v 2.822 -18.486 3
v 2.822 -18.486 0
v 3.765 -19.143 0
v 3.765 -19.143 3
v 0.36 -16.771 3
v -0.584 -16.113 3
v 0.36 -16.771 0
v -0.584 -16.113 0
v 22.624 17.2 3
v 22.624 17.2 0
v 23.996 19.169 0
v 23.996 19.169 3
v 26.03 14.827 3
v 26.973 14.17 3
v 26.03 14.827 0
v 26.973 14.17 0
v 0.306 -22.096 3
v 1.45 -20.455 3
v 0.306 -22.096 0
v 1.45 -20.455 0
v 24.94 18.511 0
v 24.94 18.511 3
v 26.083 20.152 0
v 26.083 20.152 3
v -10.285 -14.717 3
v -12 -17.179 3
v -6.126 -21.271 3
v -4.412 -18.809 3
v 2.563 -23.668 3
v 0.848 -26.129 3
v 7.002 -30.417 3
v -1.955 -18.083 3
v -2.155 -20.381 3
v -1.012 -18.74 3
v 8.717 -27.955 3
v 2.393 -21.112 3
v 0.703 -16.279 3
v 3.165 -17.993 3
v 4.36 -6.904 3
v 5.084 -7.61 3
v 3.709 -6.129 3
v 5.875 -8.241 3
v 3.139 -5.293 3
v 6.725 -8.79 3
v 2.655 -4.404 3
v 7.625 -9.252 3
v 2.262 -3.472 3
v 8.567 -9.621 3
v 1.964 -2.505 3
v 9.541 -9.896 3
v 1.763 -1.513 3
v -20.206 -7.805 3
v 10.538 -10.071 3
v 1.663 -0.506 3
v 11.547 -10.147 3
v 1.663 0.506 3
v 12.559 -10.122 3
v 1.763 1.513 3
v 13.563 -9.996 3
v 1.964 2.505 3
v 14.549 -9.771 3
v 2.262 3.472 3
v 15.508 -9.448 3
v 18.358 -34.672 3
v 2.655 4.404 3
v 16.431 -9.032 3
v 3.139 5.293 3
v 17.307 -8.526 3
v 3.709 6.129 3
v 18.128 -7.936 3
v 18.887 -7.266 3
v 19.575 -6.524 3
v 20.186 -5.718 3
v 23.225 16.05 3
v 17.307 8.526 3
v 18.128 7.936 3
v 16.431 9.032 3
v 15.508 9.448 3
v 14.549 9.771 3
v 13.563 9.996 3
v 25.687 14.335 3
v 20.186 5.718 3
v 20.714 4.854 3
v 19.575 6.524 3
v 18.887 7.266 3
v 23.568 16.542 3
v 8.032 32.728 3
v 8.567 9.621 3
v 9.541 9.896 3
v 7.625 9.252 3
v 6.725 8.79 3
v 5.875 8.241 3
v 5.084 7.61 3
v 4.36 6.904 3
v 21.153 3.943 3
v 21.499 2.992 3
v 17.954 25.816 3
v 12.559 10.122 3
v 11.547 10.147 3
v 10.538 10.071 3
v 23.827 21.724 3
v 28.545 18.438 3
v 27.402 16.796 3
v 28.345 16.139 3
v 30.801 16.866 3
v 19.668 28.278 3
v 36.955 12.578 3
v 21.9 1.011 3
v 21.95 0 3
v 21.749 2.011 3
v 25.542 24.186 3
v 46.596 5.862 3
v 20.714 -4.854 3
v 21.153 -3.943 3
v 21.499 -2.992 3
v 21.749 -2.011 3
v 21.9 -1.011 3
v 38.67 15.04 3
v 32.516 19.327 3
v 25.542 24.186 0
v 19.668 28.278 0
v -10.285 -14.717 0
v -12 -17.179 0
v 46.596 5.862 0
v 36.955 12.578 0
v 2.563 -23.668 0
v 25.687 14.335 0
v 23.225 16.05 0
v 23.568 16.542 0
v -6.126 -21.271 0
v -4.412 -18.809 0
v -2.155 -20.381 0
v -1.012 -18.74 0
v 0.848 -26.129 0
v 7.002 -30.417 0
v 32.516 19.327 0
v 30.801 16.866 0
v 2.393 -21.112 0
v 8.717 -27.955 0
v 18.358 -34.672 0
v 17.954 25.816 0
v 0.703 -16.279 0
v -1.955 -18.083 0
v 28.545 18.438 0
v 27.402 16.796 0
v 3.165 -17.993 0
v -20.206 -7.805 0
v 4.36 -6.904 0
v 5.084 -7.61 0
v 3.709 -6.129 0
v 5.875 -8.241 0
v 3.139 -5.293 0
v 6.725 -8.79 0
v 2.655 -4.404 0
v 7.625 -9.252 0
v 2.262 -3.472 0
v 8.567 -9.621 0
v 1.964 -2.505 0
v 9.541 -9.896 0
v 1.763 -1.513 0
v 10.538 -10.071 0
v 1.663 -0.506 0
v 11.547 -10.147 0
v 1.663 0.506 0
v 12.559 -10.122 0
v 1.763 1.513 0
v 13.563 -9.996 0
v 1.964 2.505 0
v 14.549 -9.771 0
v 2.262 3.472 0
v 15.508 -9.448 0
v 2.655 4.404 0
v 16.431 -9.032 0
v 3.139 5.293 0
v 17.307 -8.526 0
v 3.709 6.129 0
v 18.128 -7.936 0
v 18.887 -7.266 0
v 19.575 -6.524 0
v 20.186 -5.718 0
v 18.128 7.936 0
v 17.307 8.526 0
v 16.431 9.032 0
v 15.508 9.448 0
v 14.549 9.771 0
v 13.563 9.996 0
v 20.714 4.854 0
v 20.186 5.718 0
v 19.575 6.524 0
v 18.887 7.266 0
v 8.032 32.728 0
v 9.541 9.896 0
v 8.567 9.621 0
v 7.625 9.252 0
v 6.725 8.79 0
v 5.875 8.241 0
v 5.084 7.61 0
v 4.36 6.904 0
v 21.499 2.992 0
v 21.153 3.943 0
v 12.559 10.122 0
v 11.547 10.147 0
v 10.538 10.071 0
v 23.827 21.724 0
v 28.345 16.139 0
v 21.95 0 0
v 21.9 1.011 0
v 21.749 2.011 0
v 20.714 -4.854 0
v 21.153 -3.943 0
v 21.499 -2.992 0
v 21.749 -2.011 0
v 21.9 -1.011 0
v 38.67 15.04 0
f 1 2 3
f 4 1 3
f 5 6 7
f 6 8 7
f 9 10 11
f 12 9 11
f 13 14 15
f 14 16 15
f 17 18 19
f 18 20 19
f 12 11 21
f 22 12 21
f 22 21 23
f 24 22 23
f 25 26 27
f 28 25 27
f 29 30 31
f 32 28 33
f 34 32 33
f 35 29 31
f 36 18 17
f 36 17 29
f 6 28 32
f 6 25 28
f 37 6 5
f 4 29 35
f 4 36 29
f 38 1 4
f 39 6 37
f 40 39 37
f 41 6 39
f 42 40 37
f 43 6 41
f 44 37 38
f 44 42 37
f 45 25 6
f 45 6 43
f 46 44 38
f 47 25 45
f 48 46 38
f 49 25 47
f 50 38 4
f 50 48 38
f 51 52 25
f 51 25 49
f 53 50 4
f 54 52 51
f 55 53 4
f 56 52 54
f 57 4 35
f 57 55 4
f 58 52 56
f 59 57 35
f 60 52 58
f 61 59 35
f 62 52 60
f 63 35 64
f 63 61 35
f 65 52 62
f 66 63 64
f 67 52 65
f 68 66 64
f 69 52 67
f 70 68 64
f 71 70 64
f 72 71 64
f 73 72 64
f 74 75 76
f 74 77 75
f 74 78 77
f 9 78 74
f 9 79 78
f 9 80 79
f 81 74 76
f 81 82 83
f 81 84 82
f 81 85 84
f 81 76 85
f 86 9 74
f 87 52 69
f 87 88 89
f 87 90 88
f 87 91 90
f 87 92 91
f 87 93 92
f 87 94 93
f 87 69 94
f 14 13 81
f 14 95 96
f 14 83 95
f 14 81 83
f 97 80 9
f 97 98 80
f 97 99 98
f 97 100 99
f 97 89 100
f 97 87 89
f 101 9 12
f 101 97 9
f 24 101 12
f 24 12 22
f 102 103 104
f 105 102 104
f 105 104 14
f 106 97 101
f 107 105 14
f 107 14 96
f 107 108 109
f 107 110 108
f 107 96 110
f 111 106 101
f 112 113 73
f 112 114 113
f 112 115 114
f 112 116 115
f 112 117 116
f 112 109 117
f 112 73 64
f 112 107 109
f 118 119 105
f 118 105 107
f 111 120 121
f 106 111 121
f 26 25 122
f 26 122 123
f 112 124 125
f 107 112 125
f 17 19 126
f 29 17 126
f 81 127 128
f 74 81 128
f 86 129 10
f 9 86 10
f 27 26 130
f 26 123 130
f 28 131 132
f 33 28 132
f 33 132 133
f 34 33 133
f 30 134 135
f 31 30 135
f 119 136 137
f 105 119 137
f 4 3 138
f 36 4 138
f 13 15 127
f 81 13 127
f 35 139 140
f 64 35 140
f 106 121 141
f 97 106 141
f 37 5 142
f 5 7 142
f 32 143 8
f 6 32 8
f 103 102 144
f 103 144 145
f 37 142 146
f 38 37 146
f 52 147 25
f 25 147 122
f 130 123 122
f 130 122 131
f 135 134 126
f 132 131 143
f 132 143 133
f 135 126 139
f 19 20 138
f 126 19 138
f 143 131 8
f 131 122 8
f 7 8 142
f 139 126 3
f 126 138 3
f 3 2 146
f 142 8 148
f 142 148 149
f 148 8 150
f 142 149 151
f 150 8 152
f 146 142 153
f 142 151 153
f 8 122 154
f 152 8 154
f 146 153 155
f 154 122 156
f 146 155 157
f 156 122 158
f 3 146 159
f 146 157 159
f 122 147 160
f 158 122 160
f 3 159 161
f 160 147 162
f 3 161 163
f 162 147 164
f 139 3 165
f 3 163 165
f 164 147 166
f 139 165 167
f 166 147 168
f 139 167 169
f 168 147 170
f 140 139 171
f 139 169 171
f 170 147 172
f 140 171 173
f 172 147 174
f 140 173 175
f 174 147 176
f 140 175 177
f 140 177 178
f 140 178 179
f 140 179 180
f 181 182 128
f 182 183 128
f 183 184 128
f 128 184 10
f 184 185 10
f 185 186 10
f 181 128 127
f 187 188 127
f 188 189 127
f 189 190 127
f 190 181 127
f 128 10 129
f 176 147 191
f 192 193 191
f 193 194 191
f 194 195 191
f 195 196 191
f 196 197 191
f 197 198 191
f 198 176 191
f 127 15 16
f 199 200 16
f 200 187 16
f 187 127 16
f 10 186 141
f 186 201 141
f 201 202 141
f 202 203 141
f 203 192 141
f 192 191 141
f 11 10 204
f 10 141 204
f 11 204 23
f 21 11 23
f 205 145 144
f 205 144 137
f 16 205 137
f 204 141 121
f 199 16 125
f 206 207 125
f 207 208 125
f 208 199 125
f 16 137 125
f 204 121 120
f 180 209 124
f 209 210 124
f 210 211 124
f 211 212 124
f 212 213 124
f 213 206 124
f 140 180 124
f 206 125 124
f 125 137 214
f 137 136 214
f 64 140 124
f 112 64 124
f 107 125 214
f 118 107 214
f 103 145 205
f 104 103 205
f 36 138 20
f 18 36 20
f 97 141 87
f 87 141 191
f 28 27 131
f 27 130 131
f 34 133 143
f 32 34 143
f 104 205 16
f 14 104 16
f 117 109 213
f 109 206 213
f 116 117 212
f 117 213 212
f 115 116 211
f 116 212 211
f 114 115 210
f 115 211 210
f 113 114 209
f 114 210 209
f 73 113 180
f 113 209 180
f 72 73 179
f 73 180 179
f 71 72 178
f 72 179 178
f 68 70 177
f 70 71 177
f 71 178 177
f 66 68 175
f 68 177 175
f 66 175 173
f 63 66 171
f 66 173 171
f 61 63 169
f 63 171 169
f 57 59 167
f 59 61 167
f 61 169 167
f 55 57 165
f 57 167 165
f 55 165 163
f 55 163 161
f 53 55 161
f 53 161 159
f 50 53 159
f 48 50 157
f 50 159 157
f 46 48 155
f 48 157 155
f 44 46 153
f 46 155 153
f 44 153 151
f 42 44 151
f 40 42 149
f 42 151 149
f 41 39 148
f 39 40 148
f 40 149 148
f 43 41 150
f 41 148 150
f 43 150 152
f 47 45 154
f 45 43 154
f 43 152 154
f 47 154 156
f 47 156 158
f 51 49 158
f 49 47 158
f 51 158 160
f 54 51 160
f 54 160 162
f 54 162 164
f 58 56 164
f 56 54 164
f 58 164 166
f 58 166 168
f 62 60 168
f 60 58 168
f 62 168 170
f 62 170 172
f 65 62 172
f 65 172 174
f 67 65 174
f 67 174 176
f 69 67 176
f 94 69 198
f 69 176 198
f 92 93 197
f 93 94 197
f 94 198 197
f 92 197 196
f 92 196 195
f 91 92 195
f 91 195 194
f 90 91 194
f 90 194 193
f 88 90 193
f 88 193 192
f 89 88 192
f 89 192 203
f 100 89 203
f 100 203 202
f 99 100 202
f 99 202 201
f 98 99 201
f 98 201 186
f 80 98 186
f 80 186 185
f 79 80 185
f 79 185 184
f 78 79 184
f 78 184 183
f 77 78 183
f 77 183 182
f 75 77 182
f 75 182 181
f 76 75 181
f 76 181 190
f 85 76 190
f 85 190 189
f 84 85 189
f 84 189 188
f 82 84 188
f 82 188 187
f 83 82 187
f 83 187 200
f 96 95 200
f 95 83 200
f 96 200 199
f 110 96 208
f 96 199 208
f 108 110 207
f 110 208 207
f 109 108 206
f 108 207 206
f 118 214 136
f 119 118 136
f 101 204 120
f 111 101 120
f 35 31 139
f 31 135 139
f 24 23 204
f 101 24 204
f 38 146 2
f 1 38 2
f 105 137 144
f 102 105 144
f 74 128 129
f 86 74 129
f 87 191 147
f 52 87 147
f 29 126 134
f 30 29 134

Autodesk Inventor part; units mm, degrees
ref_plane "YZ Plane" through (0, 0, 0) normal (1, 0, 0) x (0, 1, 0)
ref_plane "XZ Plane" through (0, 0, 0) normal (0, 1, 0) x (-1, 0, 0)
ref_plane "XY Plane" through (0, 0, 0) normal (0, 0, 1) x (1, 0, 0)
sketch "Sketch1" plane through (0, 0, 0) normal (0, 0, 1) x (1, 0, 0)
  circle A0 centre (11.8, 0) radius 10.15 projected
  line L0 (0.848, -26.1294) -> (7.0019, -30.4166) projected
  line L1 (7.0019, -30.4166) -> (8.7168, -27.9551) projected
  line L2 (-11.9996, -17.1789) -> (-6.1263, -21.2706) projected
  line L3 (-6.1263, -21.2706) -> (-4.4115, -18.8091) projected
  line L4 (-4.4115, -18.8091) -> (-2.1551, -20.381) projected
  line L5 (-2.1551, -20.381) -> (-1.0118, -18.74) projected
  line L6 (-1.0118, -18.74) -> (-1.9554, -18.0826) projected
  line L7 (-1.9554, -18.0826) -> (-0.5835, -16.1134) projected
  line L8 (-0.5835, -16.1134) -> (0.3601, -16.7708) projected
  line L9 (0.3601, -16.7708) -> (0.7031, -16.2785) projected
  line L10 (0.7031, -16.2785) -> (3.1646, -17.9933) projected
  line L11 (3.1646, -17.9933) -> (2.8216, -18.4856) projected
  line L12 (2.8216, -18.4856) -> (3.7652, -19.143) projected
  line L13 (3.7652, -19.143) -> (2.3933, -21.1123) projected
  line L14 (2.3933, -21.1123) -> (1.4497, -20.4549) projected
  line L15 (1.4497, -20.4549) -> (0.3065, -22.0959) projected
  line L16 (0.3065, -22.0959) -> (2.5629, -23.6679) projected
  line L17 (2.5629, -23.6679) -> (0.848, -26.1294) projected
  line L18 (8.7168, -27.9551) -> (18.3578, -34.6717) projected
  line L19 (18.3578, -34.6717) -> (46.5961, 5.8617) projected
  line L20 (46.5961, 5.8617) -> (36.9551, 12.5783) projected
  line L21 (36.9551, 12.5783) -> (38.67, 15.0399) projected
  line L22 (38.67, 15.0399) -> (32.5161, 19.3271) projected
  line L23 (32.5161, 19.3271) -> (30.8012, 16.8655) projected
  line L24 (30.8012, 16.8655) -> (28.5448, 18.4375) projected
  line L25 (28.5448, 18.4375) -> (27.4015, 16.7965) projected
  line L26 (27.4015, 16.7965) -> (28.3451, 16.1391) projected
  line L27 (28.3451, 16.1391) -> (26.9732, 14.1699) projected
  line L28 (26.9732, 14.1699) -> (26.0296, 14.8272) projected
  line L29 (26.0296, 14.8272) -> (25.6867, 14.3349) projected
  line L30 (25.6867, 14.3349) -> (23.2251, 16.0498) projected
  line L31 (23.2251, 16.0498) -> (23.5681, 16.5421) projected
  line L32 (23.5681, 16.5421) -> (22.6245, 17.1995) projected
  line L33 (22.6245, 17.1995) -> (23.9964, 19.1687) projected
  line L34 (23.9964, 19.1687) -> (24.94, 18.5114) projected
  line L35 (24.94, 18.5114) -> (26.0833, 20.1524) projected
  line L36 (26.0833, 20.1524) -> (23.8268, 21.7244) projected
  line L37 (23.8268, 21.7244) -> (25.5417, 24.1859) projected
  line L38 (25.5417, 24.1859) -> (19.6685, 28.2776) projected
  line L39 (19.6685, 28.2776) -> (17.9536, 25.8161) projected
  line L40 (17.9536, 25.8161) -> (8.0319, 32.7281) projected
  line L41 (8.0319, 32.7281) -> (-20.2064, -7.8053) projected
  line L42 (-20.2064, -7.8053) -> (-10.2847, -14.7174) projected
  line L43 (-10.2847, -14.7174) -> (-11.9996, -17.1789) projected
  point P0 (0, 0)
extrude "Extrusion1" add sketch "Sketch1" along normal blind 3
